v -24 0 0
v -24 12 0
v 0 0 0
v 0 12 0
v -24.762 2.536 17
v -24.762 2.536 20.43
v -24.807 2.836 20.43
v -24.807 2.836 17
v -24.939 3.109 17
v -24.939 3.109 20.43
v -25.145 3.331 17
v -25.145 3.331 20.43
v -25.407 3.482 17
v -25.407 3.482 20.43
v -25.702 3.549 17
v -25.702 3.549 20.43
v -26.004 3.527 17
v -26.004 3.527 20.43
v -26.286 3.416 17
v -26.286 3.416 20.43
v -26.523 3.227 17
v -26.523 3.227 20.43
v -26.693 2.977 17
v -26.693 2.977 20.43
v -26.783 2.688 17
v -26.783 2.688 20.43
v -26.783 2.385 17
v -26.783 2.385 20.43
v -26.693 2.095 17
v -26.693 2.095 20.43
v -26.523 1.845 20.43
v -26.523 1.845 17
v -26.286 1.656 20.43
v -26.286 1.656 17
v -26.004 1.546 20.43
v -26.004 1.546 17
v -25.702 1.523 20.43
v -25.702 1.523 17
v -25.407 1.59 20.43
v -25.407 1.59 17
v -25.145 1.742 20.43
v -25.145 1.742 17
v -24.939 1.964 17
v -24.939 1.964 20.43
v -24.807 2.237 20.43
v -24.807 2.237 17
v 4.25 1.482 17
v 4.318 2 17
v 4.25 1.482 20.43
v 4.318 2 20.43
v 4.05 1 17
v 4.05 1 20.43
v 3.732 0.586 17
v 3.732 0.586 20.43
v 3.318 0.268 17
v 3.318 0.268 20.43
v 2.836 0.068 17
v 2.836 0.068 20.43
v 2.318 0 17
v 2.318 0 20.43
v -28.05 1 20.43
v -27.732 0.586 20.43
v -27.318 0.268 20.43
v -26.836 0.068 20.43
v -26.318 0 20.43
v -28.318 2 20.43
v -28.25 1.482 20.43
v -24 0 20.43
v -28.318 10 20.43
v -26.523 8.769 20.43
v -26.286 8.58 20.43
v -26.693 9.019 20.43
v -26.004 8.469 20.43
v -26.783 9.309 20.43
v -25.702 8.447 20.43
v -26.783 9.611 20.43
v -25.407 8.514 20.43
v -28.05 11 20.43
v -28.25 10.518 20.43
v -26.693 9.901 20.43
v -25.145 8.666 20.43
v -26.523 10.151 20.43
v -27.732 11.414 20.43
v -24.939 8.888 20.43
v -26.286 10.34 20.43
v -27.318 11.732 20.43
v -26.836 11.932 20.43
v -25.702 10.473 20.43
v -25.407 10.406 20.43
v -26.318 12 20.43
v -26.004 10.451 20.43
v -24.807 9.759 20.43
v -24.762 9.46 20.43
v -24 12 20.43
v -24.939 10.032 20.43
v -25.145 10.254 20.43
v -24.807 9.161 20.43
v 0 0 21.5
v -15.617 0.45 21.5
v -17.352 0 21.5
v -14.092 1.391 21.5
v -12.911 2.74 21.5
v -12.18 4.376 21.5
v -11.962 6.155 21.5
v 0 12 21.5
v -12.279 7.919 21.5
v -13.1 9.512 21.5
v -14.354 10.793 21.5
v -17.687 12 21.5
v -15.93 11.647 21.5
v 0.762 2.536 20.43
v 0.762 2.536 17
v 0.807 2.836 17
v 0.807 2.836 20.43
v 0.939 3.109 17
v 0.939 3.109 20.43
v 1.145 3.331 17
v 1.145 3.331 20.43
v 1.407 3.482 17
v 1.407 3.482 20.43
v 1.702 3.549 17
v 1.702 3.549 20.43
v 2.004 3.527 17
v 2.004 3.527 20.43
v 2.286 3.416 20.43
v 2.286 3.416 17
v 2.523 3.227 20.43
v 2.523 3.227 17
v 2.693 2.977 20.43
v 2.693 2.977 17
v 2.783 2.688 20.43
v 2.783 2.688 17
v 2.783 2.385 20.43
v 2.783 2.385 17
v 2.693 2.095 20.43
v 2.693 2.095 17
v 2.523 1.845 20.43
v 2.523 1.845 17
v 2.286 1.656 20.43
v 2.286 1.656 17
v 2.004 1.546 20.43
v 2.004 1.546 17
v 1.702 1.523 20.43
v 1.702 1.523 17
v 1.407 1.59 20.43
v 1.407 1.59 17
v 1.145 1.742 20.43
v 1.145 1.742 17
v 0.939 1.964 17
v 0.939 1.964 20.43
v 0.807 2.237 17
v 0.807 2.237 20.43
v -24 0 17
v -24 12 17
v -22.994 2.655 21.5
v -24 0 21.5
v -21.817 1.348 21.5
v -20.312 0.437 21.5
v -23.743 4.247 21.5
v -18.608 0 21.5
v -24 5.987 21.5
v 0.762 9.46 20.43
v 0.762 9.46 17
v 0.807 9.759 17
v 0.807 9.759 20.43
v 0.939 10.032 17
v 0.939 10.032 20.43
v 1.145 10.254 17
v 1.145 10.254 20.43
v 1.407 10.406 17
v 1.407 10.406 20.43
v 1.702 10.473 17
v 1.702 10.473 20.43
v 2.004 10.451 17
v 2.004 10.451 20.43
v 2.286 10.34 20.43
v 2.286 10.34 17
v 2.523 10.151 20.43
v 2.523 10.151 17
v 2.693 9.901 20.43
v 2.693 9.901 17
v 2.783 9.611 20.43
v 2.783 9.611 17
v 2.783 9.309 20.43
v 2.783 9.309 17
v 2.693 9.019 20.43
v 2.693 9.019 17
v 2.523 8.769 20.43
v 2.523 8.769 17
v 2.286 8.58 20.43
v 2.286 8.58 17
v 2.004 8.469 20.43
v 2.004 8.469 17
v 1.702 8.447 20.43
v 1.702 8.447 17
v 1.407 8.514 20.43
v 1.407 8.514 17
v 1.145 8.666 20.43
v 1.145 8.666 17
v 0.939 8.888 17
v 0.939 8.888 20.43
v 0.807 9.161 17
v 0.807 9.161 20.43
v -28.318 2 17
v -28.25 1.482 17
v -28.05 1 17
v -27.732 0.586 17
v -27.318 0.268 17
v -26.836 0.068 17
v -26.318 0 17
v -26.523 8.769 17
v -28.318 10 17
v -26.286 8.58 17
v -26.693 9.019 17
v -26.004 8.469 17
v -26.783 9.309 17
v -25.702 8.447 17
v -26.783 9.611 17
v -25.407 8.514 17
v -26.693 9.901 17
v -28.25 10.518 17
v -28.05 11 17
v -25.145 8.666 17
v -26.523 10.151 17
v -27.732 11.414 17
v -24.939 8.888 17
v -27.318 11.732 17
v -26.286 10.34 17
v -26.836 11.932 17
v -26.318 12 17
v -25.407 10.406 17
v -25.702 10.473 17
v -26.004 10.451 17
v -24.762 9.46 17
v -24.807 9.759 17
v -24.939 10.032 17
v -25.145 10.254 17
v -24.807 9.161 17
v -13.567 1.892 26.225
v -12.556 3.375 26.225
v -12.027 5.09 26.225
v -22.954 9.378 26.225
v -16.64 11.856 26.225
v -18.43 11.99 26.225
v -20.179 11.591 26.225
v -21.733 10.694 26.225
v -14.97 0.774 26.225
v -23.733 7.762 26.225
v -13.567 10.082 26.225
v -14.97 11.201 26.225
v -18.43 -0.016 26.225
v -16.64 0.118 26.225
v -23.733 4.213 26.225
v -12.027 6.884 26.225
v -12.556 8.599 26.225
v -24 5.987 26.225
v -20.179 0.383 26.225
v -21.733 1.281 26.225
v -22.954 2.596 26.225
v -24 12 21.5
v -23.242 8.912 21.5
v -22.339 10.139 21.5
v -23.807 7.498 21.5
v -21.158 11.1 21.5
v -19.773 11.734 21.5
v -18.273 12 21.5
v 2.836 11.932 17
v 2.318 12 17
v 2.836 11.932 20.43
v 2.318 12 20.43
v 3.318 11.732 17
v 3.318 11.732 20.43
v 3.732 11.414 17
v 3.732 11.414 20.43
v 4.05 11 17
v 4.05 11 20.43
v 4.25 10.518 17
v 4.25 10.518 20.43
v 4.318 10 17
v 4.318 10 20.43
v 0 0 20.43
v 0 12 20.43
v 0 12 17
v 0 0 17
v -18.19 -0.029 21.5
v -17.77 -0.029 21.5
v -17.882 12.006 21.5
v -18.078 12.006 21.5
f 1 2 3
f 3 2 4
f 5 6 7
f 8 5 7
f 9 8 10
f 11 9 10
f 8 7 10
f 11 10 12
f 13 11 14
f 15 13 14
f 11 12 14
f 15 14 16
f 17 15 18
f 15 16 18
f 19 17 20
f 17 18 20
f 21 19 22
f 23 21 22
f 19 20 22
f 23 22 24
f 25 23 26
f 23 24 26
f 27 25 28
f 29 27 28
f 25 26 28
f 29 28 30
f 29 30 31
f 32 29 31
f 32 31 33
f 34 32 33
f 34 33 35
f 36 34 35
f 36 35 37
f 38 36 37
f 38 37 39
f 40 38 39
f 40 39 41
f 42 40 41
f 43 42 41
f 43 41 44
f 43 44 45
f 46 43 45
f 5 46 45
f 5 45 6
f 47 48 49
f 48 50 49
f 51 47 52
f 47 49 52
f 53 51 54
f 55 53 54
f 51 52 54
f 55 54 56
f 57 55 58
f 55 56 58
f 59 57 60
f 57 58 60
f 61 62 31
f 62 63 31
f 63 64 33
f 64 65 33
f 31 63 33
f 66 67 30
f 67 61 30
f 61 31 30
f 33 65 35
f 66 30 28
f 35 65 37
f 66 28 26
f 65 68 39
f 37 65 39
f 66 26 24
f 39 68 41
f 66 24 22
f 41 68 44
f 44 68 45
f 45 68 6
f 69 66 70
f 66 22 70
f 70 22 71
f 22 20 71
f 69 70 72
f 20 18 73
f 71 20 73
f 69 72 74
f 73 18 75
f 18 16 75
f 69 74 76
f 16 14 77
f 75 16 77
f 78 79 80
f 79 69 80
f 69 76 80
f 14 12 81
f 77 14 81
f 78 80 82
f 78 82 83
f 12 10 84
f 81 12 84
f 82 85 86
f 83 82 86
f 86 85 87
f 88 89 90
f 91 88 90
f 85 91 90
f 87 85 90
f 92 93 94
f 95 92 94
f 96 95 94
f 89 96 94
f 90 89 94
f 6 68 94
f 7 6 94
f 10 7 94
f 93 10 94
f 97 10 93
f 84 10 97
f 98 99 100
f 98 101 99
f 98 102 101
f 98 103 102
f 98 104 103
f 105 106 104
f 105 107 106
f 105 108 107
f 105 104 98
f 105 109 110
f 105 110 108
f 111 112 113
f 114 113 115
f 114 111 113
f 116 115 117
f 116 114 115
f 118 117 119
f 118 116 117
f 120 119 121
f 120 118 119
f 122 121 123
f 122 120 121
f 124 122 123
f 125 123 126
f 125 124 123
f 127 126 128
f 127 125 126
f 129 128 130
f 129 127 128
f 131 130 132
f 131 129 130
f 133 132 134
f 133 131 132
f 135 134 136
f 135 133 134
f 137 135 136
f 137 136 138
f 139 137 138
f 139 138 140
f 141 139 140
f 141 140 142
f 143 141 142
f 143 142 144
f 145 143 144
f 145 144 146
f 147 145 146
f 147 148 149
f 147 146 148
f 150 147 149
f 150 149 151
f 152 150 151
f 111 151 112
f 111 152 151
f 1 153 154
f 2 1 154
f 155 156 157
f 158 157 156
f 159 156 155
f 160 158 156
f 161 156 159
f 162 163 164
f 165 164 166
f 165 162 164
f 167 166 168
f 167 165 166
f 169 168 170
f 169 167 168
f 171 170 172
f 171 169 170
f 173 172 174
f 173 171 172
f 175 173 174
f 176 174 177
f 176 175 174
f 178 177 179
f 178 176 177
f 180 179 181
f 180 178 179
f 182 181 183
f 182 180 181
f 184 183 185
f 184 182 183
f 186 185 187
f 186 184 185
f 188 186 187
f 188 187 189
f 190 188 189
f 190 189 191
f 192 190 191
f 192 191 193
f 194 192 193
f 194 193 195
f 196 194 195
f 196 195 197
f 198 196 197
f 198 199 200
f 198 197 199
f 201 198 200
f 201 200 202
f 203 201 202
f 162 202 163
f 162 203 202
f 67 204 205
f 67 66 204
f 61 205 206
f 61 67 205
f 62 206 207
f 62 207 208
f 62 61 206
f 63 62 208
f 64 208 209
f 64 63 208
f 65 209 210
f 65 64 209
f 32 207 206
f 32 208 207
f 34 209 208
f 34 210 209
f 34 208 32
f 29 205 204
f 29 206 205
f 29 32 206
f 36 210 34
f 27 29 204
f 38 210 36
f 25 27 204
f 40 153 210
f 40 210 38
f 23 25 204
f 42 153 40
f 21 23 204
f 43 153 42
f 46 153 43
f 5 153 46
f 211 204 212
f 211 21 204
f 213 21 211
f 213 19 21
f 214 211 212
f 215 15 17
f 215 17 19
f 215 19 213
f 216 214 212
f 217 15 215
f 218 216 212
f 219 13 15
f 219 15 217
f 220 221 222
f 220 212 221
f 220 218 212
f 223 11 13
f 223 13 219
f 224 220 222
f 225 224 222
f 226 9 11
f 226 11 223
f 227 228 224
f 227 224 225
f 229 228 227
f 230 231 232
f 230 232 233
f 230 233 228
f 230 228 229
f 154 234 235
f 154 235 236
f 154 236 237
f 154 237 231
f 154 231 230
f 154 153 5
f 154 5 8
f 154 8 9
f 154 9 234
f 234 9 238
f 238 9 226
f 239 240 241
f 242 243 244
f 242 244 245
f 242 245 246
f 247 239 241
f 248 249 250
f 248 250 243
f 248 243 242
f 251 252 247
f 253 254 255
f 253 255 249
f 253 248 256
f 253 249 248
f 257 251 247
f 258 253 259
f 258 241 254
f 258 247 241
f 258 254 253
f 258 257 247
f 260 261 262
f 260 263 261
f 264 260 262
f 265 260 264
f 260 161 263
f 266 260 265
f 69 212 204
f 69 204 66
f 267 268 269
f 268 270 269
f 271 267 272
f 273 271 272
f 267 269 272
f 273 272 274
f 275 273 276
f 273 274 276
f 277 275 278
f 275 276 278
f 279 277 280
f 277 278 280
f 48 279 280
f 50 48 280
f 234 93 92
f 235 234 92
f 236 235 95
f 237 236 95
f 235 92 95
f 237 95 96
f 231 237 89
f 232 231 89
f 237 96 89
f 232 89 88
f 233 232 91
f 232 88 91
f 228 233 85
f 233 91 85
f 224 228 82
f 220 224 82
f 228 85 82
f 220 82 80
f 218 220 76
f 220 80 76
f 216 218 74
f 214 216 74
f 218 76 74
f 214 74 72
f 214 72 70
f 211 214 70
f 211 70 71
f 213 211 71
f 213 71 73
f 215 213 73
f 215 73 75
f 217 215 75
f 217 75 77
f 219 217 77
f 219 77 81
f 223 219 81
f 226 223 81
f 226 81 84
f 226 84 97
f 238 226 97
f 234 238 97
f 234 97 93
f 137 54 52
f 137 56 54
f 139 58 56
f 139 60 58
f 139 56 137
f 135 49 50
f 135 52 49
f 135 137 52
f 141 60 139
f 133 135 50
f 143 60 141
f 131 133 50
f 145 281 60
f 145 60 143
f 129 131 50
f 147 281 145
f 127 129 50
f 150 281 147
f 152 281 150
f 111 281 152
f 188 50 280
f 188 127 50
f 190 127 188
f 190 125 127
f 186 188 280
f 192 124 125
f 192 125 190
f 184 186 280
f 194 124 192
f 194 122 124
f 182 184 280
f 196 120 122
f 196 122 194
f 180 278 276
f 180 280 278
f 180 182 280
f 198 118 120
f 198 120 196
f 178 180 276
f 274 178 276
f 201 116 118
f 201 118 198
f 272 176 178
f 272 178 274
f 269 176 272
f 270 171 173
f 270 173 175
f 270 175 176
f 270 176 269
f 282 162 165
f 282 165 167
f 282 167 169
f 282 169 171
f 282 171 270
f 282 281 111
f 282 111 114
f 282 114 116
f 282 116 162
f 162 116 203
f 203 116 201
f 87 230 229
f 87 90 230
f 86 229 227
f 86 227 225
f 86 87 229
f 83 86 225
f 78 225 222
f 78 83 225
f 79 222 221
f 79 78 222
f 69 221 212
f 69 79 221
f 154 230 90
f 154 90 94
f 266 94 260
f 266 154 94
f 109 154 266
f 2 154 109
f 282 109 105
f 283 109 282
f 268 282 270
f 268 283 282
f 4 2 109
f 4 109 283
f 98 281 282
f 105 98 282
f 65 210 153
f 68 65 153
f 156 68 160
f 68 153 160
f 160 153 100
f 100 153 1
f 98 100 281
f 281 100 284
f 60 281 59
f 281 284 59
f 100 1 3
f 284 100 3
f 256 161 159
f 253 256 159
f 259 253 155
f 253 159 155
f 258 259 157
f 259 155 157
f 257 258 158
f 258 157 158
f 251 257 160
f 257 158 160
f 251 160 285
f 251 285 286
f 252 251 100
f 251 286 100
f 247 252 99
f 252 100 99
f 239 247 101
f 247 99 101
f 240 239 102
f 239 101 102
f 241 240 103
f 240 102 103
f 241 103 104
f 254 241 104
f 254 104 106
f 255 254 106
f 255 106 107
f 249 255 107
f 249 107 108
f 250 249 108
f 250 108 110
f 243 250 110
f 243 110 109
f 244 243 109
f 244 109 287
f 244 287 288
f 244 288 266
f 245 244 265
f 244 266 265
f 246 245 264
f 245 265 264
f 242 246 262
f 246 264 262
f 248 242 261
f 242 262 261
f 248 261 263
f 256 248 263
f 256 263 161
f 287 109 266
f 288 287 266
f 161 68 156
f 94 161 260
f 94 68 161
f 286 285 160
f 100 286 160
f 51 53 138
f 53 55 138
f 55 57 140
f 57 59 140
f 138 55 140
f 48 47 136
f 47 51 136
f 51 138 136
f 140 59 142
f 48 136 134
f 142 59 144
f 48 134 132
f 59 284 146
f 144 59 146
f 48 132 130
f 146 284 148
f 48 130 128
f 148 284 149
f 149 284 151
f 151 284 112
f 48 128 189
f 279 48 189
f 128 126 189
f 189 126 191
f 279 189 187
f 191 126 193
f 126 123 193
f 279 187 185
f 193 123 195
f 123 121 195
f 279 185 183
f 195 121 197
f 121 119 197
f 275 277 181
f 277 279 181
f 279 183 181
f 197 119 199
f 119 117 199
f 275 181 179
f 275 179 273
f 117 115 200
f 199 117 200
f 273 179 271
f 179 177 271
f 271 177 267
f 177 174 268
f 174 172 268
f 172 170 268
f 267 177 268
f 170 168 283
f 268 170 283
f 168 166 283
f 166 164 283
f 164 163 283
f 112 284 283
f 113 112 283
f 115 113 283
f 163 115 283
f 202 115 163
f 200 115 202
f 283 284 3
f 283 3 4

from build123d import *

# Parameters (mm, degrees)
SKETCH1_W            = 24
SKETCH1_H            = 12
EXTRUDE1_DEPTH       = 21.5
SKETCH2_W            = 3.43
SKETCH2_H            = 12
EXTRUDE2_DEPTH       = 4.318
FILLET1_R            = 2
FILLET2_R            = 2
SKETCH3_R            = 1.016
CUT_EXTRUDE1_DEPTH   = 4.318
FILLET1_OF_MIRROR1_R = 2
FILLET2_OF_MIRROR1_R = 2
SKETCH4_R            = 6.02
EXTRUDE3_DEPTH       = 4.725


with BuildPart() as part:
    # Sketch1 → Extrude1 (new body)
    with BuildSketch(Plane.XY):
        with Locations((-12, 6)):
            Rectangle(SKETCH1_W, SKETCH1_H)
    extrude(amount=EXTRUDE1_DEPTH)

    # Sketch2 → Extrude2 (add)
    with BuildSketch(Plane.ZY.offset(24)):
        with Locations((18.715, 6)):
            Rectangle(SKETCH2_W, SKETCH2_H)
    extrude2 = extrude(amount=EXTRUDE2_DEPTH)

    # Fillet1
    fillet1_edges = [part.edges().sort_by_distance(p)[0] for p in [
        (-28.318, 12, 18.715),
    ]]
    fillet(fillet1_edges, radius=FILLET1_R)

    # Fillet2
    fillet2_edges = [part.edges().sort_by_distance(p)[0] for p in [
        (-28.318, 0, 18.715),
    ]]
    fillet(fillet2_edges, radius=FILLET2_R)

    # Sketch3 → Cut-Extrude1 (cut)
    with BuildSketch(Plane.XY.offset(20.43)):
        with Locations((-25.778, 2.53620247)):
            Circle(SKETCH3_R)
        with Locations((-25.778, 9.46)):
            Circle(SKETCH3_R)
    cut_extrude1 = extrude(amount=-CUT_EXTRUDE1_DEPTH, mode=Mode.SUBTRACT)

    # Mirror1: Extrude2, Cut-Extrude1 across plane
    add(extrude2.mirror(Plane.ZY.offset(12)))
    add(cut_extrude1.mirror(Plane.ZY.offset(12)), mode=Mode.SUBTRACT)

    # Fillet1 of Mirror1
    fillet1_of_mirror1_edges = [part.edges().sort_by_distance(p)[0] for p in [
        (4.318, 12, 18.715),
    ]]
    fillet(fillet1_of_mirror1_edges, radius=FILLET1_OF_MIRROR1_R)

    # Fillet2 of Mirror1
    fillet2_of_mirror1_edges = [part.edges().sort_by_distance(p)[0] for p in [
        (4.318, 0, 18.715),
    ]]
    fillet(fillet2_of_mirror1_edges, radius=FILLET2_OF_MIRROR1_R)

    # Sketch4 → Extrude3 (add)
    with BuildSketch(Plane.XY.offset(21.5)):
        with Locations(Location((-17.98, 5.987133141, 0), (0, 0, 180))):
            Circle(SKETCH4_R)
    extrude(amount=EXTRUDE3_DEPTH)


solid = part.part
